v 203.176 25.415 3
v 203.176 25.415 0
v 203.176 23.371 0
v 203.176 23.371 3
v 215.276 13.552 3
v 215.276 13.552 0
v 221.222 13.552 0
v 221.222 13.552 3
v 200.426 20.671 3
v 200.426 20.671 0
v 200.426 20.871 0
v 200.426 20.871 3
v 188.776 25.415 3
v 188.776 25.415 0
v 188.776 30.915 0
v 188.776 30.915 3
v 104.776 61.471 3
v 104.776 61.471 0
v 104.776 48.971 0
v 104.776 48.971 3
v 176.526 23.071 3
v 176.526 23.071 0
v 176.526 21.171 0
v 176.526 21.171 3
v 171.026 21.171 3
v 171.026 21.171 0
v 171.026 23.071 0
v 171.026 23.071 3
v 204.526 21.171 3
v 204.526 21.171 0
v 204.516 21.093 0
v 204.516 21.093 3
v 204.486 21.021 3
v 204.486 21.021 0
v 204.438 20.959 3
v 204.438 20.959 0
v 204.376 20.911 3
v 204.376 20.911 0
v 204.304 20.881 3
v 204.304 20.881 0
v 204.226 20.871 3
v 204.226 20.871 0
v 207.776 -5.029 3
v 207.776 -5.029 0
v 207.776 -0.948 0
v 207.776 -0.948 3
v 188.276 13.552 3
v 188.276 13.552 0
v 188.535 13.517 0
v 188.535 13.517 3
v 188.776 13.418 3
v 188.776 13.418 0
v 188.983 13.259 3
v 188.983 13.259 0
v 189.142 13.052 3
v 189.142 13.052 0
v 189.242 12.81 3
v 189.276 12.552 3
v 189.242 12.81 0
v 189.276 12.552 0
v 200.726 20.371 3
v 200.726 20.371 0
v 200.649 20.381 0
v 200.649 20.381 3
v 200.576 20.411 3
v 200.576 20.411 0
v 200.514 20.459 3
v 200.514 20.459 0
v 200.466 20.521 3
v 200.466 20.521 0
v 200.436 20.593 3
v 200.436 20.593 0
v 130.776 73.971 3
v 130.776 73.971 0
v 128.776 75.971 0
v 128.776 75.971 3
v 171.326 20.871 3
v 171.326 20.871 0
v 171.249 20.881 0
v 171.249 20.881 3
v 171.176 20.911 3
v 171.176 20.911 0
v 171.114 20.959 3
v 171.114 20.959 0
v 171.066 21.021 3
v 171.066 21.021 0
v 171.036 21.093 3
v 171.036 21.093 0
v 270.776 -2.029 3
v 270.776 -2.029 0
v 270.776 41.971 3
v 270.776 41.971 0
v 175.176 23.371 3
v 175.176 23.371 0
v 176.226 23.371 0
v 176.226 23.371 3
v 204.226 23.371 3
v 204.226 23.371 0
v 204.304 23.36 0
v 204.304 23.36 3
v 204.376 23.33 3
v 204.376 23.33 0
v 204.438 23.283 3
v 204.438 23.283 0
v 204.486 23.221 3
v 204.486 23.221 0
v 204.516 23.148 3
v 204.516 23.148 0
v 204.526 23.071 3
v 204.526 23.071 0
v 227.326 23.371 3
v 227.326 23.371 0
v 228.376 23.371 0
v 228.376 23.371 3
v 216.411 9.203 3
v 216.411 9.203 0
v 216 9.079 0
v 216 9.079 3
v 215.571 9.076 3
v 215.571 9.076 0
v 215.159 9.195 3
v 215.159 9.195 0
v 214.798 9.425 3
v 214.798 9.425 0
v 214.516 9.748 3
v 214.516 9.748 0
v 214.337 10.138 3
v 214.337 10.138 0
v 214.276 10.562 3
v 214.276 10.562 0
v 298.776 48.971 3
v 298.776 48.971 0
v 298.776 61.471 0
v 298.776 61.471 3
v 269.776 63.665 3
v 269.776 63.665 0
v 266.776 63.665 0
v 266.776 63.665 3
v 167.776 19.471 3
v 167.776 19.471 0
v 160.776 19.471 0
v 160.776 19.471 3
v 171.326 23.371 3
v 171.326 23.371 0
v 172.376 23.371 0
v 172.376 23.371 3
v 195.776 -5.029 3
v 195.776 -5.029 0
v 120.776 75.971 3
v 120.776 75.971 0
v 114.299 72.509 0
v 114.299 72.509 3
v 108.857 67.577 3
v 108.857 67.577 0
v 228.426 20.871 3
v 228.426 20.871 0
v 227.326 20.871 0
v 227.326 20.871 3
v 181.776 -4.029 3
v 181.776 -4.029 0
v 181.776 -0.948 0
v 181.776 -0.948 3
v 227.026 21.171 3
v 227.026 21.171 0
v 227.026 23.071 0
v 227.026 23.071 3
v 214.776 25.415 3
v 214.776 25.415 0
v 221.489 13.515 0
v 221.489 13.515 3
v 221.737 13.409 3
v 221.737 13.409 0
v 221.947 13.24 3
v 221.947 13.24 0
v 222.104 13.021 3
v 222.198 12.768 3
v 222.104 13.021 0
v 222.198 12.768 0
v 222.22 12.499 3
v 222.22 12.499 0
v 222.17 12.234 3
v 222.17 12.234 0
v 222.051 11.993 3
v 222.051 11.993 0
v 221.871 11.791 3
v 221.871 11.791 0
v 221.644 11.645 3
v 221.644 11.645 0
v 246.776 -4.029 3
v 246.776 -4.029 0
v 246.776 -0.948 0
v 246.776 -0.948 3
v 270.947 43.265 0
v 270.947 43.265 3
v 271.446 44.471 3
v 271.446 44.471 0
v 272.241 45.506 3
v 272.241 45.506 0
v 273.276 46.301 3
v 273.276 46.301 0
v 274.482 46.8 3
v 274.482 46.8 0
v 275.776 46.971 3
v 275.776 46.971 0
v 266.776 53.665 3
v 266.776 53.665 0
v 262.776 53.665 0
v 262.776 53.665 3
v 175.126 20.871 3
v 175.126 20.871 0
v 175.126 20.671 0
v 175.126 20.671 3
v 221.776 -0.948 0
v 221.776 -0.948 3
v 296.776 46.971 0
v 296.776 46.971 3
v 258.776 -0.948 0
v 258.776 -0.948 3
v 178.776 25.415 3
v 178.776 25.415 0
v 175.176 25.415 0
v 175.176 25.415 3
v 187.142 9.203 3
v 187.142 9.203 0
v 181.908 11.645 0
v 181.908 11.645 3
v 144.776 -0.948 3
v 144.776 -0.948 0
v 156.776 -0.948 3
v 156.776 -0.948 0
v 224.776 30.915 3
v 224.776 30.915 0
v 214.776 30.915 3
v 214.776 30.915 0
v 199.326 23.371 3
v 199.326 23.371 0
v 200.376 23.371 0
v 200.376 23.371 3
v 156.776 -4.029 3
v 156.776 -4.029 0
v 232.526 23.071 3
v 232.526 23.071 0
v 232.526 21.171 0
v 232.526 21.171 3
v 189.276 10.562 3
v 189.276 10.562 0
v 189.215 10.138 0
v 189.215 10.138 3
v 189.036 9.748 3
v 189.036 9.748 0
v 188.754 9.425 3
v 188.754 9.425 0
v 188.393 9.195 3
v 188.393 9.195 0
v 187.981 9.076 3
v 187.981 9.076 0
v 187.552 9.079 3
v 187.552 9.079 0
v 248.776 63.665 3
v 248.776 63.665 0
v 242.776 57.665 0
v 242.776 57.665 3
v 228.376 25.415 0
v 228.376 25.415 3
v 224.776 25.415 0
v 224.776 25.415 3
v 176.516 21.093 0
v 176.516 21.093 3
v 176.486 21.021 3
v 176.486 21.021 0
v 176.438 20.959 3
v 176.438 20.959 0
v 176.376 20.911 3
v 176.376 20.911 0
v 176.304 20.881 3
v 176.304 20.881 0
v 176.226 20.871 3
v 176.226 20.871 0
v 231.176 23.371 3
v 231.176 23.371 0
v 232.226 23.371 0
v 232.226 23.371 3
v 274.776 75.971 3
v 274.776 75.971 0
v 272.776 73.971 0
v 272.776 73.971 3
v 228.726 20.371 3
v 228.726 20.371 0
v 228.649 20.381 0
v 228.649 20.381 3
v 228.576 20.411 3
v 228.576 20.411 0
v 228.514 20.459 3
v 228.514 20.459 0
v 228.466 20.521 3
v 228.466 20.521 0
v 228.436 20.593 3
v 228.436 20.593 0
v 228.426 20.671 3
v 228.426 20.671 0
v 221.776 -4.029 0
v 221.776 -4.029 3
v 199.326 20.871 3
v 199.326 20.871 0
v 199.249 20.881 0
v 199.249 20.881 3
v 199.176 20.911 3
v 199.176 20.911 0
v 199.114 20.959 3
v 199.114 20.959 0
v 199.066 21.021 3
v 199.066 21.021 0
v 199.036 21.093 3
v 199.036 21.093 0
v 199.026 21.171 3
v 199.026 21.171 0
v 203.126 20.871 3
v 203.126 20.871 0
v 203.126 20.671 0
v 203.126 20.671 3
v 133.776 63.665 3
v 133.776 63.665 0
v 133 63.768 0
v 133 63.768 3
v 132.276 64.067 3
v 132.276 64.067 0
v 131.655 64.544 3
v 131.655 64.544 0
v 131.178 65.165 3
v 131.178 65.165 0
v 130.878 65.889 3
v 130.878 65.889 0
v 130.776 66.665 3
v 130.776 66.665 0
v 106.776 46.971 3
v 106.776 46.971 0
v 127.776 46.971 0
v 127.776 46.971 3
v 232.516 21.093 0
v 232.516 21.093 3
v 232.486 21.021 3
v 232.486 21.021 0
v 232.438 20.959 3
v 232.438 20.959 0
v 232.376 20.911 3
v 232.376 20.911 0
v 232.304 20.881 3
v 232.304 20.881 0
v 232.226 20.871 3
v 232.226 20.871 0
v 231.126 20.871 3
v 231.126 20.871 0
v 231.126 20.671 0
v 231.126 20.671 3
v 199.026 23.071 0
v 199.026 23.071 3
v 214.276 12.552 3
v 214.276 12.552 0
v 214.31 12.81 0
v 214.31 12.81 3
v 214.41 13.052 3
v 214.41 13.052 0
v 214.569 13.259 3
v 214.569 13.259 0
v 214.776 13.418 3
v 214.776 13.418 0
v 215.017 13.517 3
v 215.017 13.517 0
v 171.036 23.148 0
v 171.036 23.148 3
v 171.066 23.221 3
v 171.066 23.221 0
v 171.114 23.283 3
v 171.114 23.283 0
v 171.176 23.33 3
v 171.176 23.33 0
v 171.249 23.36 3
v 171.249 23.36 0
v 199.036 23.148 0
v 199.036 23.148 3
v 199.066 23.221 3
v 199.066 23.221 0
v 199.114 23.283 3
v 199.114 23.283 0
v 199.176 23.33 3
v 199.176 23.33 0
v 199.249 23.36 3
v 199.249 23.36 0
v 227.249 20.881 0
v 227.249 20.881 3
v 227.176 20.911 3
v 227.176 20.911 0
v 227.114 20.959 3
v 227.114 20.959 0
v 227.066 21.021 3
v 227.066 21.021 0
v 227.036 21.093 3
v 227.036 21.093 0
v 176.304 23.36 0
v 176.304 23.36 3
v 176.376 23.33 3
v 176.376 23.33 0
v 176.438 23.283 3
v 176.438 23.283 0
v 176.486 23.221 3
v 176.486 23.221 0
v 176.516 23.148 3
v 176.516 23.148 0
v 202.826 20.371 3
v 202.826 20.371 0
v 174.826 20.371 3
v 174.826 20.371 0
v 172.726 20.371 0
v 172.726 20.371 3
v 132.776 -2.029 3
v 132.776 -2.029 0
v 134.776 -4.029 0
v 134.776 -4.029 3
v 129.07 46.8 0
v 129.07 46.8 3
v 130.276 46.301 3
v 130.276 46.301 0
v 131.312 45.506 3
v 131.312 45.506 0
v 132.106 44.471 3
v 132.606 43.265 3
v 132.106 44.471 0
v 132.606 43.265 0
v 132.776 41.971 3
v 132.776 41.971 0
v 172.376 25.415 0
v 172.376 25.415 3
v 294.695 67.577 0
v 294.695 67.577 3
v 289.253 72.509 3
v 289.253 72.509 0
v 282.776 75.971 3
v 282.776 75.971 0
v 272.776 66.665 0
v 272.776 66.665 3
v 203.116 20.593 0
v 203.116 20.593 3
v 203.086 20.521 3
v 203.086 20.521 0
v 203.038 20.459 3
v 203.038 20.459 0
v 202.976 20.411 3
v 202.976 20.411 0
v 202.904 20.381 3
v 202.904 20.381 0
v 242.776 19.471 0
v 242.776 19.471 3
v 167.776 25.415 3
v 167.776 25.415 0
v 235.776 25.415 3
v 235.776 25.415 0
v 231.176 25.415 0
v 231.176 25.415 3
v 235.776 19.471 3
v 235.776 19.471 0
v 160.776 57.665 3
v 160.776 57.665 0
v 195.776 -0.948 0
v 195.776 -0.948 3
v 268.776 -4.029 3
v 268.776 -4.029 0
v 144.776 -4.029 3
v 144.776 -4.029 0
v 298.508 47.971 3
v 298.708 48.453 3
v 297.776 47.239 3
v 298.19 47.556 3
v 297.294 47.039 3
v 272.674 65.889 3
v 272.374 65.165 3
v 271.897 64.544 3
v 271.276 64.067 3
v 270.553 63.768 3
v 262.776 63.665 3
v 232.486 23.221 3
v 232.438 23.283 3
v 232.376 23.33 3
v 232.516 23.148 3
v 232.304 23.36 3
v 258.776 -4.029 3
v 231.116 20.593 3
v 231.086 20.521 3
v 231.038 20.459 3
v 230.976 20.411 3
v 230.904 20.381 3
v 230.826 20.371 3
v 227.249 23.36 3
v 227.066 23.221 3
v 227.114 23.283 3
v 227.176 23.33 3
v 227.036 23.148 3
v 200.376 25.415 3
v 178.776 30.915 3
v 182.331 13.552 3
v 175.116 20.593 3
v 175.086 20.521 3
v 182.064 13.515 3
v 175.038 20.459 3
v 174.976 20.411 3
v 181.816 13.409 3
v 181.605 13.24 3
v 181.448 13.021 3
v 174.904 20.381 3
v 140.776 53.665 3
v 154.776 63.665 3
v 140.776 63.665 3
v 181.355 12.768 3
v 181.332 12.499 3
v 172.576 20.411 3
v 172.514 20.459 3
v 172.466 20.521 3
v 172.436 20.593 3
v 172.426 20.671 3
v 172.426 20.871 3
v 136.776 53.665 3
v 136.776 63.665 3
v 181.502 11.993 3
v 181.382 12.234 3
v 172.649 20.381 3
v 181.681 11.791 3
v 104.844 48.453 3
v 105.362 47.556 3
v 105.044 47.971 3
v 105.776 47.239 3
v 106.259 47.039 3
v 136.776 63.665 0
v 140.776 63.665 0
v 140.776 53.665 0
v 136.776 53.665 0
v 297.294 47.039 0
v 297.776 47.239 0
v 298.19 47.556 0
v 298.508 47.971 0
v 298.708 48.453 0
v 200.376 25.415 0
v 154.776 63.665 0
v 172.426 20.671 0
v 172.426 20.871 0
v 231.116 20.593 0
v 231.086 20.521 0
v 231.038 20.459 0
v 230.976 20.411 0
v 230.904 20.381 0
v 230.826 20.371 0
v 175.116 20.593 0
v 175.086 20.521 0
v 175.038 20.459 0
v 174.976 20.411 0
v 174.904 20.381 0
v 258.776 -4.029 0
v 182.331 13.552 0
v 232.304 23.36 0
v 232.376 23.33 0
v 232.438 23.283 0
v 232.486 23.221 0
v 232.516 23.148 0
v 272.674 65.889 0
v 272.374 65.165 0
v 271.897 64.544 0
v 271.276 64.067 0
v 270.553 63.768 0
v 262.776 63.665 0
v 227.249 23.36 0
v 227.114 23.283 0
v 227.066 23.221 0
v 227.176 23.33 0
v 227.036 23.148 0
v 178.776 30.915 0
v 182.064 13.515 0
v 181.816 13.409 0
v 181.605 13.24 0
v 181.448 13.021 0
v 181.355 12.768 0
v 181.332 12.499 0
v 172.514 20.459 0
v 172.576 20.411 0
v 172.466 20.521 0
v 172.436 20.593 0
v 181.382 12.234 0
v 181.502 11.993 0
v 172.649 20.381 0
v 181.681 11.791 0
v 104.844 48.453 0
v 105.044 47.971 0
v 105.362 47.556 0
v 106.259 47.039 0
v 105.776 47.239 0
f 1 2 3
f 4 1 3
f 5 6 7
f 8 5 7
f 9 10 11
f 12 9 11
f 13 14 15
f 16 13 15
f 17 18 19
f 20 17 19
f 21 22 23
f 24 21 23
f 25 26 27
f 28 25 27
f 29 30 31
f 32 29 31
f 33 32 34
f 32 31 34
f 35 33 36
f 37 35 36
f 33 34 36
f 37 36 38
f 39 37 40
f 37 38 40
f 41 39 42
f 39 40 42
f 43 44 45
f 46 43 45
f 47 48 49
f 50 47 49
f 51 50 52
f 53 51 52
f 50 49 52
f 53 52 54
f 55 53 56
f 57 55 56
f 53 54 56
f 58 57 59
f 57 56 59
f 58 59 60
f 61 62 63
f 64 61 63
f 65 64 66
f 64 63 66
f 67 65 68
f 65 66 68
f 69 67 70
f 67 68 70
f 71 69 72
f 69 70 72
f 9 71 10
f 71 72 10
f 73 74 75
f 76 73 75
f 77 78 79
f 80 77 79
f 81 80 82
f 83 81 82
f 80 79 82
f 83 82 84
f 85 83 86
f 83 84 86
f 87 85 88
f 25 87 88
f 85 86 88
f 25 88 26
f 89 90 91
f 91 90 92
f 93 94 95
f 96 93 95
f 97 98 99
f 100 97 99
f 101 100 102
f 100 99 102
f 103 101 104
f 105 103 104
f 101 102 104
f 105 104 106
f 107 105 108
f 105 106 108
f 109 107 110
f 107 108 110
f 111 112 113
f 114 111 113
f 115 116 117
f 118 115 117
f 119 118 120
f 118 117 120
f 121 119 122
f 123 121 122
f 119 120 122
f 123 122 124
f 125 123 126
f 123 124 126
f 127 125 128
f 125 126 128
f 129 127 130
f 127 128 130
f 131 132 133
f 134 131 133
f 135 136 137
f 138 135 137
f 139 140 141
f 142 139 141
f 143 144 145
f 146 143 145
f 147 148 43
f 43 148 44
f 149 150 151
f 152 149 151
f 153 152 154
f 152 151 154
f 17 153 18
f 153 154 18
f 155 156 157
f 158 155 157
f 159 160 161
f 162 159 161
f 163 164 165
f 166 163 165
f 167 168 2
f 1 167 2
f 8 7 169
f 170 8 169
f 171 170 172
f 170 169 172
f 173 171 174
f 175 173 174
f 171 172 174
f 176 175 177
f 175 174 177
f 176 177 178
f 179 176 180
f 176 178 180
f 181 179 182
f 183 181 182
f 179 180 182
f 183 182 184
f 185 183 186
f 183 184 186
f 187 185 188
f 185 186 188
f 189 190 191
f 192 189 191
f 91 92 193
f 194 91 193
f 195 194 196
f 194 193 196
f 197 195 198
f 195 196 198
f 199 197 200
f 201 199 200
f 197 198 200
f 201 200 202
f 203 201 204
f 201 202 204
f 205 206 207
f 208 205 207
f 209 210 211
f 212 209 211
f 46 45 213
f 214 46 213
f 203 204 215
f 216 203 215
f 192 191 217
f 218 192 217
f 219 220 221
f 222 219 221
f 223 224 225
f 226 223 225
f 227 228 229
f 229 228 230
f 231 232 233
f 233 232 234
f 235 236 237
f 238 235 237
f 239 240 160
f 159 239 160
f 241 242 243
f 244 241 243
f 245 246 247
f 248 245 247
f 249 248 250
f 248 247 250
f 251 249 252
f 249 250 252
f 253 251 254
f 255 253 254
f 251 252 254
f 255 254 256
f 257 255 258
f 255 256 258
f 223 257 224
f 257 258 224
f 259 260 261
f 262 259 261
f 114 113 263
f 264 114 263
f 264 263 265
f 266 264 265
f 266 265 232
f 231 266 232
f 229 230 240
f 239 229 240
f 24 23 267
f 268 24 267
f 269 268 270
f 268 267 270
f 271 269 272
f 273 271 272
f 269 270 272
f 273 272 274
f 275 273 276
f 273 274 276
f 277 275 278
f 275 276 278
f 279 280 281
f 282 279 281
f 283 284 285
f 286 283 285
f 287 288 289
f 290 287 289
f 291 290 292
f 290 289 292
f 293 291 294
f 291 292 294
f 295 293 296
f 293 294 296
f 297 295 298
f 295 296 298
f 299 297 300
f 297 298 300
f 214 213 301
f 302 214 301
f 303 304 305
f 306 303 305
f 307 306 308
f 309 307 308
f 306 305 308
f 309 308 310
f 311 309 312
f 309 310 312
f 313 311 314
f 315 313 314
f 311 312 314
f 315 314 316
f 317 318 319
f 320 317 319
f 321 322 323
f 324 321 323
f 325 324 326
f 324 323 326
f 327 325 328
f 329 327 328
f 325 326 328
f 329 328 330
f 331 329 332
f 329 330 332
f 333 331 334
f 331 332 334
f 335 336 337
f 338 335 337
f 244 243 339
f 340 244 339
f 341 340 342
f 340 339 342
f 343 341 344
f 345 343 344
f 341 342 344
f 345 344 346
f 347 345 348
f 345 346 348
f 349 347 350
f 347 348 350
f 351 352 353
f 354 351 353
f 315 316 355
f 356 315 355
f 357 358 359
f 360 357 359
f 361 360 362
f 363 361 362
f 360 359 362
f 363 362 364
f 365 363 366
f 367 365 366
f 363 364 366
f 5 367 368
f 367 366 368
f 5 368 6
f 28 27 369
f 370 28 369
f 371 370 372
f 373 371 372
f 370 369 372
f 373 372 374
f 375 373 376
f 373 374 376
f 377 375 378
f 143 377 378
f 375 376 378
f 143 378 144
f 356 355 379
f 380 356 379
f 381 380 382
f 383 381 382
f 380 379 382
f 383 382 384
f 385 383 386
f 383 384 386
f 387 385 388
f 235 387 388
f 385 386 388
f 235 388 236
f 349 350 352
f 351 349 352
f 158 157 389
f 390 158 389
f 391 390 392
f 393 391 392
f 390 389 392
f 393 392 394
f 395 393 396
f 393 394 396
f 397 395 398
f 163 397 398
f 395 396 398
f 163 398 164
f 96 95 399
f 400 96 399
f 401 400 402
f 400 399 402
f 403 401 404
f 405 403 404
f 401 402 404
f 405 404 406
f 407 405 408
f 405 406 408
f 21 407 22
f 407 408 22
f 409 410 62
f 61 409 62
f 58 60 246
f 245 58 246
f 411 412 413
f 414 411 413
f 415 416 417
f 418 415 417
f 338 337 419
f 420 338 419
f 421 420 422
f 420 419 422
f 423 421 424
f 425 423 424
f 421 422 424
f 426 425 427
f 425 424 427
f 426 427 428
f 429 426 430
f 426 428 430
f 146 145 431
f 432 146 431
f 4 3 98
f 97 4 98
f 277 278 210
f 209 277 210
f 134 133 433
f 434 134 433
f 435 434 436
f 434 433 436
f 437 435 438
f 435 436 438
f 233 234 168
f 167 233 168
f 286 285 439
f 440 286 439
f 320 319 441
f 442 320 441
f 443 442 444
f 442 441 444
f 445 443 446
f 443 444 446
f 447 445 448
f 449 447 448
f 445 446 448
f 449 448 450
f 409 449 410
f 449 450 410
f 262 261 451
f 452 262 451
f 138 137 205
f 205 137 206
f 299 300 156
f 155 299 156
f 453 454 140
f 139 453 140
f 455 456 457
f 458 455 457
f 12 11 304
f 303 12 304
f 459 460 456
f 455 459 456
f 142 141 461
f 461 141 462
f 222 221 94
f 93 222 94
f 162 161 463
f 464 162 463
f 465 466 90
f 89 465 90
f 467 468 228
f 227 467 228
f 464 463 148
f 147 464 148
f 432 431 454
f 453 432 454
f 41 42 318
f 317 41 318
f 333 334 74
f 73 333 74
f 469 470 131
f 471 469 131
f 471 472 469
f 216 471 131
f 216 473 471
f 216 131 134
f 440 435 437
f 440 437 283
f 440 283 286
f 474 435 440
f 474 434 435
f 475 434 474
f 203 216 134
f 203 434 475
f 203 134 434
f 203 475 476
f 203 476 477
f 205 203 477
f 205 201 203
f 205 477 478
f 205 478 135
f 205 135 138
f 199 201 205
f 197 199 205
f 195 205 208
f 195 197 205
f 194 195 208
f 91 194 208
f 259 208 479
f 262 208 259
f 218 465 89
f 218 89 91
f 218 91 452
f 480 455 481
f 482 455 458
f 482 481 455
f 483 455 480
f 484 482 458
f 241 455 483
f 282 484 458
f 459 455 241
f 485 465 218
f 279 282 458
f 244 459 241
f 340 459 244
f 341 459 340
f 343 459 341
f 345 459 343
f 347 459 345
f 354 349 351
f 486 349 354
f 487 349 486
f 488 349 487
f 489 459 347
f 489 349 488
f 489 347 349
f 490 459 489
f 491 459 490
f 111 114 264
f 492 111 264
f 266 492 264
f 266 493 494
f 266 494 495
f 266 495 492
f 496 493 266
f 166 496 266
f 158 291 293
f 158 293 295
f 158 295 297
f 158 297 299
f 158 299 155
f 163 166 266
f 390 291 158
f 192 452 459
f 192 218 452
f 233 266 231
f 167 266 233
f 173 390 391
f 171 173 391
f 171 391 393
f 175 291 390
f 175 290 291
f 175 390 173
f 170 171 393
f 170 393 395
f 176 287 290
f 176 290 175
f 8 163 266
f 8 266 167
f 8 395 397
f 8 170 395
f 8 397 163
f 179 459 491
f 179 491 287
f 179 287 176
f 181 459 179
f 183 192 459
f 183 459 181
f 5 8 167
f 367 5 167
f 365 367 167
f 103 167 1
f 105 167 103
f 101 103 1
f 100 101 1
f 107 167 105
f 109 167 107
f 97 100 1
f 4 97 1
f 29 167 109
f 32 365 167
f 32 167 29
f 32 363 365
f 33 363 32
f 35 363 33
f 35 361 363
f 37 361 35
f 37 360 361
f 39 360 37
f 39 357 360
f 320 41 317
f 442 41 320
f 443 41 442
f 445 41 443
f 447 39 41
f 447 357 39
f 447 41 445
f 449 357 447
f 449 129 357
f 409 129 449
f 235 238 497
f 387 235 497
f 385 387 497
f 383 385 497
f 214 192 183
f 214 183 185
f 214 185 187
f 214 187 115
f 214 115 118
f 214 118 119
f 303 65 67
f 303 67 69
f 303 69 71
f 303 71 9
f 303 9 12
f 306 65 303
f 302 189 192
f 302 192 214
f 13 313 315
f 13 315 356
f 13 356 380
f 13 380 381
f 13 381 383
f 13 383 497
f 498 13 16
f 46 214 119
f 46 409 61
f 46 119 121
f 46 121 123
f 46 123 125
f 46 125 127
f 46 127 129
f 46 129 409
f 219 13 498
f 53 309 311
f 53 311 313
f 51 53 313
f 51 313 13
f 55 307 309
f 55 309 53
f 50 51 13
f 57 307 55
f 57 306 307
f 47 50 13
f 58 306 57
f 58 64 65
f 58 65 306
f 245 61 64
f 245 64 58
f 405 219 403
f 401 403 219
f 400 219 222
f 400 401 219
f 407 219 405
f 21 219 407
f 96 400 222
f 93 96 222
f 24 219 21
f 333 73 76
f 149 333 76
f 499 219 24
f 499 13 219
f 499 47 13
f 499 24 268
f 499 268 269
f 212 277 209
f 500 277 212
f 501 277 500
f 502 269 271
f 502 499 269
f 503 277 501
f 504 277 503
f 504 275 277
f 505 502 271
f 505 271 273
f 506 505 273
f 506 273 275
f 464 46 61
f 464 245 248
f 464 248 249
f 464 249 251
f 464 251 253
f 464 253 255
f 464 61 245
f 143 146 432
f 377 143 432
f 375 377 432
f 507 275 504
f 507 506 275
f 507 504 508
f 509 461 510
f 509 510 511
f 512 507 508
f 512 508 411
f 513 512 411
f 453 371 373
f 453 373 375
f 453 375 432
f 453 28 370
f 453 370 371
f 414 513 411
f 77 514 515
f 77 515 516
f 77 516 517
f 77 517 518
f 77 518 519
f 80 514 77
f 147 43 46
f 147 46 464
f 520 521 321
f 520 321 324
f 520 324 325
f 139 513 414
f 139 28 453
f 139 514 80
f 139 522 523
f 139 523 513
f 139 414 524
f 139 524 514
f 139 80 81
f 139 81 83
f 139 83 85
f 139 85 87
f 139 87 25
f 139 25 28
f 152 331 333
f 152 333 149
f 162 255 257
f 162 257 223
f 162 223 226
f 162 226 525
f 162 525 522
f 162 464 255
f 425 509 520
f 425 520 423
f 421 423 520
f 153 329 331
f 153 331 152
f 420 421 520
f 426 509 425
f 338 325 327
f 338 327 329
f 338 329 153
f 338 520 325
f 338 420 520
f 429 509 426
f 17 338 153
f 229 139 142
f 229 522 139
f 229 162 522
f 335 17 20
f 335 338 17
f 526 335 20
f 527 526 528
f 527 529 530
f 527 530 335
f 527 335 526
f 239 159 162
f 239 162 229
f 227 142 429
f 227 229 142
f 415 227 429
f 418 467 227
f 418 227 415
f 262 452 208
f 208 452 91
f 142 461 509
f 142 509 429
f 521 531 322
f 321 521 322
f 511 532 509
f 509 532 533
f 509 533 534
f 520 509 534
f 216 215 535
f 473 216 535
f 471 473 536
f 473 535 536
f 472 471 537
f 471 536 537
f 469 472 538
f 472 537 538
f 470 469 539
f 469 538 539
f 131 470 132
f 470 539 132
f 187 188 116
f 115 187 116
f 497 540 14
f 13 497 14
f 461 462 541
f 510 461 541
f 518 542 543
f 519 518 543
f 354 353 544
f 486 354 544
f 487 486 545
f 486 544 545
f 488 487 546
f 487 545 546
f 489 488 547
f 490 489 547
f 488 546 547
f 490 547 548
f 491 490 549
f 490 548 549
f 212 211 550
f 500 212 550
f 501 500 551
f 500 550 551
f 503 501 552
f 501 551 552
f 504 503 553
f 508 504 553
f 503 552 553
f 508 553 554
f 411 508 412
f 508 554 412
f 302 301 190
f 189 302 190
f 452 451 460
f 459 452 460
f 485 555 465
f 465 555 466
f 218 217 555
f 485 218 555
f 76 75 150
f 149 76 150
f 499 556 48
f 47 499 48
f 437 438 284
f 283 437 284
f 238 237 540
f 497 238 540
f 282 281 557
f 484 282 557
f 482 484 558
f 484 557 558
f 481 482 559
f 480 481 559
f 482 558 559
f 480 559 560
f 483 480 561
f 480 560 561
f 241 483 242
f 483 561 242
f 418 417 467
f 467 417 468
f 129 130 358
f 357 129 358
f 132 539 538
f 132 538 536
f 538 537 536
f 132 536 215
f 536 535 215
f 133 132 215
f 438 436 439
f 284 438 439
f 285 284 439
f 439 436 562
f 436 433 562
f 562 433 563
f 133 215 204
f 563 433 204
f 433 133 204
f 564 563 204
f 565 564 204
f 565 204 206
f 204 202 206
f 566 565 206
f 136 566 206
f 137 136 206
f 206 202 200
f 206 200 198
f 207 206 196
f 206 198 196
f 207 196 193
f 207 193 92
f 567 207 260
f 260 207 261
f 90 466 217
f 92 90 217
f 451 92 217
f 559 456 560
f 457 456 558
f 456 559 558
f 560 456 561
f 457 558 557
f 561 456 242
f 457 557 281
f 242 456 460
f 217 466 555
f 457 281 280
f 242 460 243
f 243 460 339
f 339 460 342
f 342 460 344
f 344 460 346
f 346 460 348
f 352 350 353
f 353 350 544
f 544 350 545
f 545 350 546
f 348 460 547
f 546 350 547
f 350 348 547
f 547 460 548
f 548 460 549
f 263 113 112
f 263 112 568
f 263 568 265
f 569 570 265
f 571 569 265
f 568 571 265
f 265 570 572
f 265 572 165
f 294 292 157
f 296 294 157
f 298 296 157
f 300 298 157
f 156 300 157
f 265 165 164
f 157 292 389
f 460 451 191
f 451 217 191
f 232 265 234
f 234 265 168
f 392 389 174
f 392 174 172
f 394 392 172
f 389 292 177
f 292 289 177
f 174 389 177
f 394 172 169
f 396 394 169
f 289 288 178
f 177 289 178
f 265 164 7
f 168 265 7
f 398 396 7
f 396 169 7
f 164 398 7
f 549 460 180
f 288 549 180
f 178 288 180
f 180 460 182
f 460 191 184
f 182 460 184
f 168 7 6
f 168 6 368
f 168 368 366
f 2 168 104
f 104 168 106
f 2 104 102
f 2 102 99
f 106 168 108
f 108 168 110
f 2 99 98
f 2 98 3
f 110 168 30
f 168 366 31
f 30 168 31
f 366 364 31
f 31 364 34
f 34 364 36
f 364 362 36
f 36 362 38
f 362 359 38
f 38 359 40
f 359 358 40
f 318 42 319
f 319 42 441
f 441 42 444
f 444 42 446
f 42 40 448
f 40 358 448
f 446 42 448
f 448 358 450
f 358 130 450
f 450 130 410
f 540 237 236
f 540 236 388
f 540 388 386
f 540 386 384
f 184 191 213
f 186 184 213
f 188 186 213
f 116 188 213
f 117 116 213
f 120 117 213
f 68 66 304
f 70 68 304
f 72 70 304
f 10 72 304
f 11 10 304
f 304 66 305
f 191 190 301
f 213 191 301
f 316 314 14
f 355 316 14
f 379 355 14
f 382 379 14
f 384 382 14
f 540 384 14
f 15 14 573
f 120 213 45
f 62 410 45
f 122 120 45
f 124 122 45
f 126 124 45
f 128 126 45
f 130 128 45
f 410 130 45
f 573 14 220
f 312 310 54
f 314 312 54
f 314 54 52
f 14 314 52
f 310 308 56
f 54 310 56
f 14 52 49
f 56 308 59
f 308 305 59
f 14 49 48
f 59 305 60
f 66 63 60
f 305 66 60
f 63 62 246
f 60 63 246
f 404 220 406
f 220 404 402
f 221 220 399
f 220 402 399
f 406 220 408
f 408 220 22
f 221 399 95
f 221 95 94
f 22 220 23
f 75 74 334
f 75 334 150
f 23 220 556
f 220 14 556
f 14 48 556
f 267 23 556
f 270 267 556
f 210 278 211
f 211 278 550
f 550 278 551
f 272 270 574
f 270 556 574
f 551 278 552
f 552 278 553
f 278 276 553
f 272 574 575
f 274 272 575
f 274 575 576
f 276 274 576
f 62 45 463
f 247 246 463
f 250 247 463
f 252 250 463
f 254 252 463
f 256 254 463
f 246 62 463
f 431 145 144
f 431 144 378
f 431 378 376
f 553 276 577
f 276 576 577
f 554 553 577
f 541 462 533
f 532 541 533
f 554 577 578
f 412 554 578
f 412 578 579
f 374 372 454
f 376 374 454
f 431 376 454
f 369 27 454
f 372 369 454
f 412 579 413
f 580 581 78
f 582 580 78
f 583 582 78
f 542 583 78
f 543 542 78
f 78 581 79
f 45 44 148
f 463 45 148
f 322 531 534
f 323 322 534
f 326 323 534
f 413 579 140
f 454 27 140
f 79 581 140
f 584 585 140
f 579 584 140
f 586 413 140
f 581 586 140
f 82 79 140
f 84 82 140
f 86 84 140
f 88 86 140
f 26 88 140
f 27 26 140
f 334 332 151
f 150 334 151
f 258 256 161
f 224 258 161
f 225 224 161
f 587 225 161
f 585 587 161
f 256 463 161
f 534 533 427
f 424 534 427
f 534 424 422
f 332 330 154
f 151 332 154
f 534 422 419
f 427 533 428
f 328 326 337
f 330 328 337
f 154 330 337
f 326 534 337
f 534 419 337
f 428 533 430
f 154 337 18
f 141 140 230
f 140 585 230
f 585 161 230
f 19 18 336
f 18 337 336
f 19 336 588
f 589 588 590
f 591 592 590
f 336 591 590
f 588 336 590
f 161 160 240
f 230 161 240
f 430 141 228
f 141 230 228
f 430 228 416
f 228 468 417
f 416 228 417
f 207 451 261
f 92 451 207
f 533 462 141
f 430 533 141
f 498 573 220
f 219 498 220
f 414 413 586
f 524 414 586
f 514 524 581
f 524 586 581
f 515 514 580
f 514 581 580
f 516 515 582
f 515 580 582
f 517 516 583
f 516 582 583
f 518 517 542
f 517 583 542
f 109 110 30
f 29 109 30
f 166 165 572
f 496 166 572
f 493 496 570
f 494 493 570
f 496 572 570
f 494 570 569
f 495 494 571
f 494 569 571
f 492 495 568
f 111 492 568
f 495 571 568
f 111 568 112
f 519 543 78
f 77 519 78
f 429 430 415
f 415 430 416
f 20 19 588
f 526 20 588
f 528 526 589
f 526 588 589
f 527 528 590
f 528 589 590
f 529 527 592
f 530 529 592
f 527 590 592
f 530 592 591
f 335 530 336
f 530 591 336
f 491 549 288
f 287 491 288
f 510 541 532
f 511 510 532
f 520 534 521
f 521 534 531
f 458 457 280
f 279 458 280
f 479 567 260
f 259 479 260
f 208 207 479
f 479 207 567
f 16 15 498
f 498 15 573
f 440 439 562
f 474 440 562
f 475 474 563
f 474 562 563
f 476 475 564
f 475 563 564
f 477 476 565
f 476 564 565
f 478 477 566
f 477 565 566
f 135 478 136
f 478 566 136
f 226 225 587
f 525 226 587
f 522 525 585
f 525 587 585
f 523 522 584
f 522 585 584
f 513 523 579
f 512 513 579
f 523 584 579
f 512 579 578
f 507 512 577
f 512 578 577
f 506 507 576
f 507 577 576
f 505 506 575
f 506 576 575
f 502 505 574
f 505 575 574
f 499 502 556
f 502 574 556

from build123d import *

# Parameters (mm, degrees)
EXTRUDE_1_DEPTH = 3


with BuildPart() as part:
    # 草图1 → 凸台-拉伸1 (new body)
    with BuildSketch(Plane(origin=(0, 0, 0), x_dir=(-1, 0, 0), z_dir=(0, 0, 1))):
        with BuildLine():
            Line((-132.77617551, 2.029328632), (-134.77617551, 4.029328632))
            Line((-134.77617551, 4.029328632), (-144.77617551, 4.029328632))
            Line((-144.77617551, 4.029328632), (-144.77617551, 0.948486637))
            Line((-144.77617551, 0.948486637), (-156.77617551, 0.948486637))
            Line((-156.77617551, 0.948486637), (-156.77617551, 4.029328632))
            Line((-156.77617551, 4.029328632), (-181.77617551, 4.029328632))
            Line((-181.77617551, 4.029328632), (-181.77617551, 0.948486637))
            Line((-181.77617551, 0.948486637), (-195.77617551, 0.948486637))
            Line((-195.77617551, 0.948486637), (-195.77617551, 5.029328632))
            Line((-195.77617551, 5.029328632), (-207.77617551, 5.029328632))
            Line((-207.77617551, 5.029328632), (-207.77617551, 0.948486637))
            Line((-207.77617551, 0.948486637), (-221.77617551, 0.948486637))
            Line((-221.77617551, 0.948486637), (-221.77617551, 4.029328632))
            Line((-221.77617551, 4.029328632), (-246.77617551, 4.029328632))
            Line((-246.77617551, 4.029328632), (-246.77617551, 0.948486637))
            Line((-246.77617551, 0.948486637), (-258.77617551, 0.948486637))
            Line((-258.77617551, 0.948486637), (-258.77617551, 4.029328632))
            Line((-258.77617551, 4.029328632), (-268.77617551, 4.029328632))
            Line((-268.77617551, 4.029328632), (-270.77617551, 2.029328632))
            Line((-270.77617551, 2.029328632), (-270.77617551, -41.970671368))
            ThreePointArc((-270.77617551, -41.970671368), (-272.240641604, -45.506205274), (-275.77617551, -46.970671368))
            Line((-275.77617551, -46.970671368), (-296.77617551, -46.970671368))
            ThreePointArc((-296.77617551, -46.970671368), (-298.190389072, -47.556457806), (-298.77617551, -48.970671368))
            Line((-298.77617551, -48.970671368), (-298.77617551, -61.470671368))
            ThreePointArc((-298.77617551, -61.470671368), (-292.125960742, -70.210089556), (-282.77617551, -75.970671368))
            Line((-282.77617551, -75.970671368), (-274.77617551, -75.970671368))
            Line((-274.77617551, -75.970671368), (-272.77617551, -73.970671368))
            Line((-272.77617551, -73.970671368), (-272.77617551, -66.665321612))
            ThreePointArc((-272.77617551, -66.665321612), (-271.897495853, -64.544001269), (-269.77617551, -63.665321612))
            Line((-269.77617551, -63.665321612), (-266.77617551, -63.665321612))
            Line((-266.77617551, -63.665321612), (-266.77617551, -53.665321612))
            Line((-266.77617551, -53.665321612), (-262.77617551, -53.665321612))
            Line((-262.77617551, -53.665321612), (-262.77617551, -63.665321612))
            Line((-262.77617551, -63.665321612), (-248.77617551, -63.665321612))
            Line((-248.77617551, -63.665321612), (-242.77617551, -57.665321612))
            Line((-242.77617551, -57.665321612), (-242.77617551, -19.470671368))
            Line((-242.77617551, -19.470671368), (-235.77617551, -19.470671368))
            Line((-235.77617551, -19.470671368), (-235.77617551, -25.415321612))
            Line((-235.77617551, -25.415321612), (-231.17617551, -25.415321612))
            Line((-231.17617551, -25.415321612), (-231.17617551, -23.370671368))
            Line((-231.17617551, -23.370671368), (-232.22617551, -23.370671368))
            ThreePointArc((-232.22617551, -23.370671368), (-232.438307544, -23.282803402), (-232.52617551, -23.070671368))
            Line((-232.52617551, -23.070671368), (-232.52617551, -21.170671368))
            ThreePointArc((-232.52617551, -21.170671368), (-232.438307544, -20.958539334), (-232.22617551, -20.870671368))
            Line((-232.22617551, -20.870671368), (-231.12617551, -20.870671368))
            Line((-231.12617551, -20.870671368), (-231.12617551, -20.670671368))
            ThreePointArc((-231.12617551, -20.670671368), (-231.038307544, -20.458539334), (-230.82617551, -20.370671368))
            Line((-230.82617551, -20.370671368), (-228.72617551, -20.370671368))
            ThreePointArc((-228.72617551, -20.370671368), (-228.514043475, -20.458539334), (-228.42617551, -20.670671368))
            Line((-228.42617551, -20.670671368), (-228.42617551, -20.870671368))
            Line((-228.42617551, -20.870671368), (-227.32617551, -20.870671368))
            ThreePointArc((-227.32617551, -20.870671368), (-227.114043475, -20.958539334), (-227.02617551, -21.170671368))
            Line((-227.02617551, -21.170671368), (-227.02617551, -23.070671368))
            ThreePointArc((-227.02617551, -23.070671368), (-227.114043475, -23.282803402), (-227.32617551, -23.370671368))
            Line((-227.32617551, -23.370671368), (-228.37617551, -23.370671368))
            Line((-228.37617551, -23.370671368), (-228.37617551, -25.415321612))
            Line((-228.37617551, -25.415321612), (-224.77617551, -25.415321612))
            Line((-224.77617551, -25.415321612), (-224.77617551, -30.915321612))
            Line((-224.77617551, -30.915321612), (-214.77617551, -30.915321612))
            Line((-214.77617551, -30.915321612), (-214.77617551, -25.415321612))
            Line((-214.77617551, -25.415321612), (-203.17617551, -25.415321612))
            Line((-203.17617551, -25.415321612), (-203.17617551, -23.370671368))
            Line((-203.17617551, -23.370671368), (-204.22617551, -23.370671368))
            ThreePointArc((-204.22617551, -23.370671368), (-204.438307544, -23.282803402), (-204.52617551, -23.070671368))
            Line((-204.52617551, -23.070671368), (-204.52617551, -21.170671368))
            ThreePointArc((-204.52617551, -21.170671368), (-204.438307544, -20.958539334), (-204.22617551, -20.870671368))
            Line((-204.22617551, -20.870671368), (-203.12617551, -20.870671368))
            Line((-203.12617551, -20.870671368), (-203.12617551, -20.670671368))
            ThreePointArc((-203.12617551, -20.670671368), (-203.038307544, -20.458539334), (-202.82617551, -20.370671368))
            Line((-202.82617551, -20.370671368), (-200.72617551, -20.370671368))
            ThreePointArc((-200.72617551, -20.370671368), (-200.514043475, -20.458539334), (-200.42617551, -20.670671368))
            Line((-200.42617551, -20.670671368), (-200.42617551, -20.870671368))
            Line((-200.42617551, -20.870671368), (-199.32617551, -20.870671368))
            ThreePointArc((-199.32617551, -20.870671368), (-199.114043475, -20.958539334), (-199.02617551, -21.170671368))
            Line((-199.02617551, -21.170671368), (-199.02617551, -23.070671368))
            ThreePointArc((-199.02617551, -23.070671368), (-199.114043475, -23.282803402), (-199.32617551, -23.370671368))
            Line((-199.32617551, -23.370671368), (-200.37617551, -23.370671368))
            Line((-200.37617551, -23.370671368), (-200.37617551, -25.415321612))
            Line((-200.37617551, -25.415321612), (-188.77617551, -25.415321612))
            Line((-188.77617551, -25.415321612), (-188.77617551, -30.915321612))
            Line((-188.77617551, -30.915321612), (-178.77617551, -30.915321612))
            Line((-178.77617551, -30.915321612), (-178.77617551, -25.415321612))
            Line((-178.77617551, -25.415321612), (-175.17617551, -25.415321612))
            Line((-175.17617551, -25.415321612), (-175.17617551, -23.370671368))
            Line((-175.17617551, -23.370671368), (-176.22617551, -23.370671368))
            ThreePointArc((-176.22617551, -23.370671368), (-176.438307544, -23.282803402), (-176.52617551, -23.070671368))
            Line((-176.52617551, -23.070671368), (-176.52617551, -21.170671368))
            ThreePointArc((-176.52617551, -21.170671368), (-176.438307544, -20.958539334), (-176.22617551, -20.870671368))
            Line((-176.22617551, -20.870671368), (-175.12617551, -20.870671368))
            Line((-175.12617551, -20.870671368), (-175.12617551, -20.670671368))
            ThreePointArc((-175.12617551, -20.670671368), (-175.038307544, -20.458539334), (-174.82617551, -20.370671368))
            Line((-174.82617551, -20.370671368), (-172.72617551, -20.370671368))
            ThreePointArc((-172.72617551, -20.370671368), (-172.514043475, -20.458539334), (-172.42617551, -20.670671368))
            Line((-172.42617551, -20.670671368), (-172.42617551, -20.870671368))
            Line((-172.42617551, -20.870671368), (-171.32617551, -20.870671368))
            ThreePointArc((-171.32617551, -20.870671368), (-171.114043475, -20.958539334), (-171.02617551, -21.170671368))
            Line((-171.02617551, -21.170671368), (-171.02617551, -23.070671368))
            ThreePointArc((-171.02617551, -23.070671368), (-171.114043475, -23.282803402), (-171.32617551, -23.370671368))
            Line((-171.32617551, -23.370671368), (-172.37617551, -23.370671368))
            Line((-172.37617551, -23.370671368), (-172.37617551, -25.415321612))
            Line((-172.37617551, -25.415321612), (-167.77617551, -25.415321612))
            Line((-167.77617551, -25.415321612), (-167.77617551, -19.470671368))
            Line((-167.77617551, -19.470671368), (-160.77617551, -19.470671368))
            Line((-160.77617551, -19.470671368), (-160.77617551, -57.665321612))
            Line((-160.77617551, -57.665321612), (-154.77617551, -63.665321612))
            Line((-154.77617551, -63.665321612), (-140.77617551, -63.665321612))
            Line((-140.77617551, -63.665321612), (-140.77617551, -53.665321612))
            Line((-140.77617551, -53.665321612), (-136.77617551, -53.665321612))
            Line((-136.77617551, -53.665321612), (-136.77617551, -63.665321612))
            Line((-136.77617551, -63.665321612), (-133.77617551, -63.665321612))
            ThreePointArc((-133.77617551, -63.665321612), (-131.654855166, -64.544001269), (-130.77617551, -66.665321612))
            Line((-130.77617551, -66.665321612), (-130.77617551, -73.970671368))
            Line((-130.77617551, -73.970671368), (-128.77617551, -75.970671368))
            Line((-128.77617551, -75.970671368), (-120.77617551, -75.970671368))
            ThreePointArc((-120.77617551, -75.970671368), (-111.426390277, -70.210089556), (-104.77617551, -61.470671368))
            Line((-104.77617551, -61.470671368), (-104.77617551, -48.970671368))
            ThreePointArc((-104.77617551, -48.970671368), (-105.361961947, -47.556457806), (-106.77617551, -46.970671368))
            Line((-106.77617551, -46.970671368), (-127.77617551, -46.970671368))
            ThreePointArc((-127.77617551, -46.970671368), (-131.311709416, -45.506205274), (-132.77617551, -41.970671368))
            Line((-132.77617551, -41.970671368), (-132.77617551, 2.029328632))
        make_face()
        with BuildLine():
            Line((-187.141847312, -9.202827725), (-181.907913386, -11.645330223))
            ThreePointArc((-181.907913386, -11.645330223), (-181.354534763, -12.768096904), (-182.330798852, -13.551513363))
            Line((-182.330798852, -13.551513363), (-188.27617551, -13.551513363))
            ThreePointArc((-188.27617551, -13.551513363), (-188.983282291, -13.258620144), (-189.27617551, -12.551513363))
            Line((-189.27617551, -12.551513363), (-189.27617551, -10.562102435))
            ThreePointArc((-189.27617551, -10.562102435), (-188.58193841, -9.296896464), (-187.141847312, -9.202827725))
        make_face(mode=Mode.SUBTRACT)
        with BuildLine():
            Line((-221.644437633, -11.645330223), (-216.410503708, -9.202827725))
            ThreePointArc((-216.410503708, -9.202827725), (-214.970412609, -9.296896464), (-214.27617551, -10.562102435))
            Line((-214.27617551, -10.562102435), (-214.27617551, -12.551513363))
            ThreePointArc((-214.27617551, -12.551513363), (-214.569068729, -13.258620144), (-215.27617551, -13.551513363))
            Line((-215.27617551, -13.551513363), (-221.221552168, -13.551513363))
            ThreePointArc((-221.221552168, -13.551513363), (-222.197816256, -12.768096904), (-221.644437633, -11.645330223))
        make_face(mode=Mode.SUBTRACT)
    extrude(amount=EXTRUDE_1_DEPTH)


solid = part.part
